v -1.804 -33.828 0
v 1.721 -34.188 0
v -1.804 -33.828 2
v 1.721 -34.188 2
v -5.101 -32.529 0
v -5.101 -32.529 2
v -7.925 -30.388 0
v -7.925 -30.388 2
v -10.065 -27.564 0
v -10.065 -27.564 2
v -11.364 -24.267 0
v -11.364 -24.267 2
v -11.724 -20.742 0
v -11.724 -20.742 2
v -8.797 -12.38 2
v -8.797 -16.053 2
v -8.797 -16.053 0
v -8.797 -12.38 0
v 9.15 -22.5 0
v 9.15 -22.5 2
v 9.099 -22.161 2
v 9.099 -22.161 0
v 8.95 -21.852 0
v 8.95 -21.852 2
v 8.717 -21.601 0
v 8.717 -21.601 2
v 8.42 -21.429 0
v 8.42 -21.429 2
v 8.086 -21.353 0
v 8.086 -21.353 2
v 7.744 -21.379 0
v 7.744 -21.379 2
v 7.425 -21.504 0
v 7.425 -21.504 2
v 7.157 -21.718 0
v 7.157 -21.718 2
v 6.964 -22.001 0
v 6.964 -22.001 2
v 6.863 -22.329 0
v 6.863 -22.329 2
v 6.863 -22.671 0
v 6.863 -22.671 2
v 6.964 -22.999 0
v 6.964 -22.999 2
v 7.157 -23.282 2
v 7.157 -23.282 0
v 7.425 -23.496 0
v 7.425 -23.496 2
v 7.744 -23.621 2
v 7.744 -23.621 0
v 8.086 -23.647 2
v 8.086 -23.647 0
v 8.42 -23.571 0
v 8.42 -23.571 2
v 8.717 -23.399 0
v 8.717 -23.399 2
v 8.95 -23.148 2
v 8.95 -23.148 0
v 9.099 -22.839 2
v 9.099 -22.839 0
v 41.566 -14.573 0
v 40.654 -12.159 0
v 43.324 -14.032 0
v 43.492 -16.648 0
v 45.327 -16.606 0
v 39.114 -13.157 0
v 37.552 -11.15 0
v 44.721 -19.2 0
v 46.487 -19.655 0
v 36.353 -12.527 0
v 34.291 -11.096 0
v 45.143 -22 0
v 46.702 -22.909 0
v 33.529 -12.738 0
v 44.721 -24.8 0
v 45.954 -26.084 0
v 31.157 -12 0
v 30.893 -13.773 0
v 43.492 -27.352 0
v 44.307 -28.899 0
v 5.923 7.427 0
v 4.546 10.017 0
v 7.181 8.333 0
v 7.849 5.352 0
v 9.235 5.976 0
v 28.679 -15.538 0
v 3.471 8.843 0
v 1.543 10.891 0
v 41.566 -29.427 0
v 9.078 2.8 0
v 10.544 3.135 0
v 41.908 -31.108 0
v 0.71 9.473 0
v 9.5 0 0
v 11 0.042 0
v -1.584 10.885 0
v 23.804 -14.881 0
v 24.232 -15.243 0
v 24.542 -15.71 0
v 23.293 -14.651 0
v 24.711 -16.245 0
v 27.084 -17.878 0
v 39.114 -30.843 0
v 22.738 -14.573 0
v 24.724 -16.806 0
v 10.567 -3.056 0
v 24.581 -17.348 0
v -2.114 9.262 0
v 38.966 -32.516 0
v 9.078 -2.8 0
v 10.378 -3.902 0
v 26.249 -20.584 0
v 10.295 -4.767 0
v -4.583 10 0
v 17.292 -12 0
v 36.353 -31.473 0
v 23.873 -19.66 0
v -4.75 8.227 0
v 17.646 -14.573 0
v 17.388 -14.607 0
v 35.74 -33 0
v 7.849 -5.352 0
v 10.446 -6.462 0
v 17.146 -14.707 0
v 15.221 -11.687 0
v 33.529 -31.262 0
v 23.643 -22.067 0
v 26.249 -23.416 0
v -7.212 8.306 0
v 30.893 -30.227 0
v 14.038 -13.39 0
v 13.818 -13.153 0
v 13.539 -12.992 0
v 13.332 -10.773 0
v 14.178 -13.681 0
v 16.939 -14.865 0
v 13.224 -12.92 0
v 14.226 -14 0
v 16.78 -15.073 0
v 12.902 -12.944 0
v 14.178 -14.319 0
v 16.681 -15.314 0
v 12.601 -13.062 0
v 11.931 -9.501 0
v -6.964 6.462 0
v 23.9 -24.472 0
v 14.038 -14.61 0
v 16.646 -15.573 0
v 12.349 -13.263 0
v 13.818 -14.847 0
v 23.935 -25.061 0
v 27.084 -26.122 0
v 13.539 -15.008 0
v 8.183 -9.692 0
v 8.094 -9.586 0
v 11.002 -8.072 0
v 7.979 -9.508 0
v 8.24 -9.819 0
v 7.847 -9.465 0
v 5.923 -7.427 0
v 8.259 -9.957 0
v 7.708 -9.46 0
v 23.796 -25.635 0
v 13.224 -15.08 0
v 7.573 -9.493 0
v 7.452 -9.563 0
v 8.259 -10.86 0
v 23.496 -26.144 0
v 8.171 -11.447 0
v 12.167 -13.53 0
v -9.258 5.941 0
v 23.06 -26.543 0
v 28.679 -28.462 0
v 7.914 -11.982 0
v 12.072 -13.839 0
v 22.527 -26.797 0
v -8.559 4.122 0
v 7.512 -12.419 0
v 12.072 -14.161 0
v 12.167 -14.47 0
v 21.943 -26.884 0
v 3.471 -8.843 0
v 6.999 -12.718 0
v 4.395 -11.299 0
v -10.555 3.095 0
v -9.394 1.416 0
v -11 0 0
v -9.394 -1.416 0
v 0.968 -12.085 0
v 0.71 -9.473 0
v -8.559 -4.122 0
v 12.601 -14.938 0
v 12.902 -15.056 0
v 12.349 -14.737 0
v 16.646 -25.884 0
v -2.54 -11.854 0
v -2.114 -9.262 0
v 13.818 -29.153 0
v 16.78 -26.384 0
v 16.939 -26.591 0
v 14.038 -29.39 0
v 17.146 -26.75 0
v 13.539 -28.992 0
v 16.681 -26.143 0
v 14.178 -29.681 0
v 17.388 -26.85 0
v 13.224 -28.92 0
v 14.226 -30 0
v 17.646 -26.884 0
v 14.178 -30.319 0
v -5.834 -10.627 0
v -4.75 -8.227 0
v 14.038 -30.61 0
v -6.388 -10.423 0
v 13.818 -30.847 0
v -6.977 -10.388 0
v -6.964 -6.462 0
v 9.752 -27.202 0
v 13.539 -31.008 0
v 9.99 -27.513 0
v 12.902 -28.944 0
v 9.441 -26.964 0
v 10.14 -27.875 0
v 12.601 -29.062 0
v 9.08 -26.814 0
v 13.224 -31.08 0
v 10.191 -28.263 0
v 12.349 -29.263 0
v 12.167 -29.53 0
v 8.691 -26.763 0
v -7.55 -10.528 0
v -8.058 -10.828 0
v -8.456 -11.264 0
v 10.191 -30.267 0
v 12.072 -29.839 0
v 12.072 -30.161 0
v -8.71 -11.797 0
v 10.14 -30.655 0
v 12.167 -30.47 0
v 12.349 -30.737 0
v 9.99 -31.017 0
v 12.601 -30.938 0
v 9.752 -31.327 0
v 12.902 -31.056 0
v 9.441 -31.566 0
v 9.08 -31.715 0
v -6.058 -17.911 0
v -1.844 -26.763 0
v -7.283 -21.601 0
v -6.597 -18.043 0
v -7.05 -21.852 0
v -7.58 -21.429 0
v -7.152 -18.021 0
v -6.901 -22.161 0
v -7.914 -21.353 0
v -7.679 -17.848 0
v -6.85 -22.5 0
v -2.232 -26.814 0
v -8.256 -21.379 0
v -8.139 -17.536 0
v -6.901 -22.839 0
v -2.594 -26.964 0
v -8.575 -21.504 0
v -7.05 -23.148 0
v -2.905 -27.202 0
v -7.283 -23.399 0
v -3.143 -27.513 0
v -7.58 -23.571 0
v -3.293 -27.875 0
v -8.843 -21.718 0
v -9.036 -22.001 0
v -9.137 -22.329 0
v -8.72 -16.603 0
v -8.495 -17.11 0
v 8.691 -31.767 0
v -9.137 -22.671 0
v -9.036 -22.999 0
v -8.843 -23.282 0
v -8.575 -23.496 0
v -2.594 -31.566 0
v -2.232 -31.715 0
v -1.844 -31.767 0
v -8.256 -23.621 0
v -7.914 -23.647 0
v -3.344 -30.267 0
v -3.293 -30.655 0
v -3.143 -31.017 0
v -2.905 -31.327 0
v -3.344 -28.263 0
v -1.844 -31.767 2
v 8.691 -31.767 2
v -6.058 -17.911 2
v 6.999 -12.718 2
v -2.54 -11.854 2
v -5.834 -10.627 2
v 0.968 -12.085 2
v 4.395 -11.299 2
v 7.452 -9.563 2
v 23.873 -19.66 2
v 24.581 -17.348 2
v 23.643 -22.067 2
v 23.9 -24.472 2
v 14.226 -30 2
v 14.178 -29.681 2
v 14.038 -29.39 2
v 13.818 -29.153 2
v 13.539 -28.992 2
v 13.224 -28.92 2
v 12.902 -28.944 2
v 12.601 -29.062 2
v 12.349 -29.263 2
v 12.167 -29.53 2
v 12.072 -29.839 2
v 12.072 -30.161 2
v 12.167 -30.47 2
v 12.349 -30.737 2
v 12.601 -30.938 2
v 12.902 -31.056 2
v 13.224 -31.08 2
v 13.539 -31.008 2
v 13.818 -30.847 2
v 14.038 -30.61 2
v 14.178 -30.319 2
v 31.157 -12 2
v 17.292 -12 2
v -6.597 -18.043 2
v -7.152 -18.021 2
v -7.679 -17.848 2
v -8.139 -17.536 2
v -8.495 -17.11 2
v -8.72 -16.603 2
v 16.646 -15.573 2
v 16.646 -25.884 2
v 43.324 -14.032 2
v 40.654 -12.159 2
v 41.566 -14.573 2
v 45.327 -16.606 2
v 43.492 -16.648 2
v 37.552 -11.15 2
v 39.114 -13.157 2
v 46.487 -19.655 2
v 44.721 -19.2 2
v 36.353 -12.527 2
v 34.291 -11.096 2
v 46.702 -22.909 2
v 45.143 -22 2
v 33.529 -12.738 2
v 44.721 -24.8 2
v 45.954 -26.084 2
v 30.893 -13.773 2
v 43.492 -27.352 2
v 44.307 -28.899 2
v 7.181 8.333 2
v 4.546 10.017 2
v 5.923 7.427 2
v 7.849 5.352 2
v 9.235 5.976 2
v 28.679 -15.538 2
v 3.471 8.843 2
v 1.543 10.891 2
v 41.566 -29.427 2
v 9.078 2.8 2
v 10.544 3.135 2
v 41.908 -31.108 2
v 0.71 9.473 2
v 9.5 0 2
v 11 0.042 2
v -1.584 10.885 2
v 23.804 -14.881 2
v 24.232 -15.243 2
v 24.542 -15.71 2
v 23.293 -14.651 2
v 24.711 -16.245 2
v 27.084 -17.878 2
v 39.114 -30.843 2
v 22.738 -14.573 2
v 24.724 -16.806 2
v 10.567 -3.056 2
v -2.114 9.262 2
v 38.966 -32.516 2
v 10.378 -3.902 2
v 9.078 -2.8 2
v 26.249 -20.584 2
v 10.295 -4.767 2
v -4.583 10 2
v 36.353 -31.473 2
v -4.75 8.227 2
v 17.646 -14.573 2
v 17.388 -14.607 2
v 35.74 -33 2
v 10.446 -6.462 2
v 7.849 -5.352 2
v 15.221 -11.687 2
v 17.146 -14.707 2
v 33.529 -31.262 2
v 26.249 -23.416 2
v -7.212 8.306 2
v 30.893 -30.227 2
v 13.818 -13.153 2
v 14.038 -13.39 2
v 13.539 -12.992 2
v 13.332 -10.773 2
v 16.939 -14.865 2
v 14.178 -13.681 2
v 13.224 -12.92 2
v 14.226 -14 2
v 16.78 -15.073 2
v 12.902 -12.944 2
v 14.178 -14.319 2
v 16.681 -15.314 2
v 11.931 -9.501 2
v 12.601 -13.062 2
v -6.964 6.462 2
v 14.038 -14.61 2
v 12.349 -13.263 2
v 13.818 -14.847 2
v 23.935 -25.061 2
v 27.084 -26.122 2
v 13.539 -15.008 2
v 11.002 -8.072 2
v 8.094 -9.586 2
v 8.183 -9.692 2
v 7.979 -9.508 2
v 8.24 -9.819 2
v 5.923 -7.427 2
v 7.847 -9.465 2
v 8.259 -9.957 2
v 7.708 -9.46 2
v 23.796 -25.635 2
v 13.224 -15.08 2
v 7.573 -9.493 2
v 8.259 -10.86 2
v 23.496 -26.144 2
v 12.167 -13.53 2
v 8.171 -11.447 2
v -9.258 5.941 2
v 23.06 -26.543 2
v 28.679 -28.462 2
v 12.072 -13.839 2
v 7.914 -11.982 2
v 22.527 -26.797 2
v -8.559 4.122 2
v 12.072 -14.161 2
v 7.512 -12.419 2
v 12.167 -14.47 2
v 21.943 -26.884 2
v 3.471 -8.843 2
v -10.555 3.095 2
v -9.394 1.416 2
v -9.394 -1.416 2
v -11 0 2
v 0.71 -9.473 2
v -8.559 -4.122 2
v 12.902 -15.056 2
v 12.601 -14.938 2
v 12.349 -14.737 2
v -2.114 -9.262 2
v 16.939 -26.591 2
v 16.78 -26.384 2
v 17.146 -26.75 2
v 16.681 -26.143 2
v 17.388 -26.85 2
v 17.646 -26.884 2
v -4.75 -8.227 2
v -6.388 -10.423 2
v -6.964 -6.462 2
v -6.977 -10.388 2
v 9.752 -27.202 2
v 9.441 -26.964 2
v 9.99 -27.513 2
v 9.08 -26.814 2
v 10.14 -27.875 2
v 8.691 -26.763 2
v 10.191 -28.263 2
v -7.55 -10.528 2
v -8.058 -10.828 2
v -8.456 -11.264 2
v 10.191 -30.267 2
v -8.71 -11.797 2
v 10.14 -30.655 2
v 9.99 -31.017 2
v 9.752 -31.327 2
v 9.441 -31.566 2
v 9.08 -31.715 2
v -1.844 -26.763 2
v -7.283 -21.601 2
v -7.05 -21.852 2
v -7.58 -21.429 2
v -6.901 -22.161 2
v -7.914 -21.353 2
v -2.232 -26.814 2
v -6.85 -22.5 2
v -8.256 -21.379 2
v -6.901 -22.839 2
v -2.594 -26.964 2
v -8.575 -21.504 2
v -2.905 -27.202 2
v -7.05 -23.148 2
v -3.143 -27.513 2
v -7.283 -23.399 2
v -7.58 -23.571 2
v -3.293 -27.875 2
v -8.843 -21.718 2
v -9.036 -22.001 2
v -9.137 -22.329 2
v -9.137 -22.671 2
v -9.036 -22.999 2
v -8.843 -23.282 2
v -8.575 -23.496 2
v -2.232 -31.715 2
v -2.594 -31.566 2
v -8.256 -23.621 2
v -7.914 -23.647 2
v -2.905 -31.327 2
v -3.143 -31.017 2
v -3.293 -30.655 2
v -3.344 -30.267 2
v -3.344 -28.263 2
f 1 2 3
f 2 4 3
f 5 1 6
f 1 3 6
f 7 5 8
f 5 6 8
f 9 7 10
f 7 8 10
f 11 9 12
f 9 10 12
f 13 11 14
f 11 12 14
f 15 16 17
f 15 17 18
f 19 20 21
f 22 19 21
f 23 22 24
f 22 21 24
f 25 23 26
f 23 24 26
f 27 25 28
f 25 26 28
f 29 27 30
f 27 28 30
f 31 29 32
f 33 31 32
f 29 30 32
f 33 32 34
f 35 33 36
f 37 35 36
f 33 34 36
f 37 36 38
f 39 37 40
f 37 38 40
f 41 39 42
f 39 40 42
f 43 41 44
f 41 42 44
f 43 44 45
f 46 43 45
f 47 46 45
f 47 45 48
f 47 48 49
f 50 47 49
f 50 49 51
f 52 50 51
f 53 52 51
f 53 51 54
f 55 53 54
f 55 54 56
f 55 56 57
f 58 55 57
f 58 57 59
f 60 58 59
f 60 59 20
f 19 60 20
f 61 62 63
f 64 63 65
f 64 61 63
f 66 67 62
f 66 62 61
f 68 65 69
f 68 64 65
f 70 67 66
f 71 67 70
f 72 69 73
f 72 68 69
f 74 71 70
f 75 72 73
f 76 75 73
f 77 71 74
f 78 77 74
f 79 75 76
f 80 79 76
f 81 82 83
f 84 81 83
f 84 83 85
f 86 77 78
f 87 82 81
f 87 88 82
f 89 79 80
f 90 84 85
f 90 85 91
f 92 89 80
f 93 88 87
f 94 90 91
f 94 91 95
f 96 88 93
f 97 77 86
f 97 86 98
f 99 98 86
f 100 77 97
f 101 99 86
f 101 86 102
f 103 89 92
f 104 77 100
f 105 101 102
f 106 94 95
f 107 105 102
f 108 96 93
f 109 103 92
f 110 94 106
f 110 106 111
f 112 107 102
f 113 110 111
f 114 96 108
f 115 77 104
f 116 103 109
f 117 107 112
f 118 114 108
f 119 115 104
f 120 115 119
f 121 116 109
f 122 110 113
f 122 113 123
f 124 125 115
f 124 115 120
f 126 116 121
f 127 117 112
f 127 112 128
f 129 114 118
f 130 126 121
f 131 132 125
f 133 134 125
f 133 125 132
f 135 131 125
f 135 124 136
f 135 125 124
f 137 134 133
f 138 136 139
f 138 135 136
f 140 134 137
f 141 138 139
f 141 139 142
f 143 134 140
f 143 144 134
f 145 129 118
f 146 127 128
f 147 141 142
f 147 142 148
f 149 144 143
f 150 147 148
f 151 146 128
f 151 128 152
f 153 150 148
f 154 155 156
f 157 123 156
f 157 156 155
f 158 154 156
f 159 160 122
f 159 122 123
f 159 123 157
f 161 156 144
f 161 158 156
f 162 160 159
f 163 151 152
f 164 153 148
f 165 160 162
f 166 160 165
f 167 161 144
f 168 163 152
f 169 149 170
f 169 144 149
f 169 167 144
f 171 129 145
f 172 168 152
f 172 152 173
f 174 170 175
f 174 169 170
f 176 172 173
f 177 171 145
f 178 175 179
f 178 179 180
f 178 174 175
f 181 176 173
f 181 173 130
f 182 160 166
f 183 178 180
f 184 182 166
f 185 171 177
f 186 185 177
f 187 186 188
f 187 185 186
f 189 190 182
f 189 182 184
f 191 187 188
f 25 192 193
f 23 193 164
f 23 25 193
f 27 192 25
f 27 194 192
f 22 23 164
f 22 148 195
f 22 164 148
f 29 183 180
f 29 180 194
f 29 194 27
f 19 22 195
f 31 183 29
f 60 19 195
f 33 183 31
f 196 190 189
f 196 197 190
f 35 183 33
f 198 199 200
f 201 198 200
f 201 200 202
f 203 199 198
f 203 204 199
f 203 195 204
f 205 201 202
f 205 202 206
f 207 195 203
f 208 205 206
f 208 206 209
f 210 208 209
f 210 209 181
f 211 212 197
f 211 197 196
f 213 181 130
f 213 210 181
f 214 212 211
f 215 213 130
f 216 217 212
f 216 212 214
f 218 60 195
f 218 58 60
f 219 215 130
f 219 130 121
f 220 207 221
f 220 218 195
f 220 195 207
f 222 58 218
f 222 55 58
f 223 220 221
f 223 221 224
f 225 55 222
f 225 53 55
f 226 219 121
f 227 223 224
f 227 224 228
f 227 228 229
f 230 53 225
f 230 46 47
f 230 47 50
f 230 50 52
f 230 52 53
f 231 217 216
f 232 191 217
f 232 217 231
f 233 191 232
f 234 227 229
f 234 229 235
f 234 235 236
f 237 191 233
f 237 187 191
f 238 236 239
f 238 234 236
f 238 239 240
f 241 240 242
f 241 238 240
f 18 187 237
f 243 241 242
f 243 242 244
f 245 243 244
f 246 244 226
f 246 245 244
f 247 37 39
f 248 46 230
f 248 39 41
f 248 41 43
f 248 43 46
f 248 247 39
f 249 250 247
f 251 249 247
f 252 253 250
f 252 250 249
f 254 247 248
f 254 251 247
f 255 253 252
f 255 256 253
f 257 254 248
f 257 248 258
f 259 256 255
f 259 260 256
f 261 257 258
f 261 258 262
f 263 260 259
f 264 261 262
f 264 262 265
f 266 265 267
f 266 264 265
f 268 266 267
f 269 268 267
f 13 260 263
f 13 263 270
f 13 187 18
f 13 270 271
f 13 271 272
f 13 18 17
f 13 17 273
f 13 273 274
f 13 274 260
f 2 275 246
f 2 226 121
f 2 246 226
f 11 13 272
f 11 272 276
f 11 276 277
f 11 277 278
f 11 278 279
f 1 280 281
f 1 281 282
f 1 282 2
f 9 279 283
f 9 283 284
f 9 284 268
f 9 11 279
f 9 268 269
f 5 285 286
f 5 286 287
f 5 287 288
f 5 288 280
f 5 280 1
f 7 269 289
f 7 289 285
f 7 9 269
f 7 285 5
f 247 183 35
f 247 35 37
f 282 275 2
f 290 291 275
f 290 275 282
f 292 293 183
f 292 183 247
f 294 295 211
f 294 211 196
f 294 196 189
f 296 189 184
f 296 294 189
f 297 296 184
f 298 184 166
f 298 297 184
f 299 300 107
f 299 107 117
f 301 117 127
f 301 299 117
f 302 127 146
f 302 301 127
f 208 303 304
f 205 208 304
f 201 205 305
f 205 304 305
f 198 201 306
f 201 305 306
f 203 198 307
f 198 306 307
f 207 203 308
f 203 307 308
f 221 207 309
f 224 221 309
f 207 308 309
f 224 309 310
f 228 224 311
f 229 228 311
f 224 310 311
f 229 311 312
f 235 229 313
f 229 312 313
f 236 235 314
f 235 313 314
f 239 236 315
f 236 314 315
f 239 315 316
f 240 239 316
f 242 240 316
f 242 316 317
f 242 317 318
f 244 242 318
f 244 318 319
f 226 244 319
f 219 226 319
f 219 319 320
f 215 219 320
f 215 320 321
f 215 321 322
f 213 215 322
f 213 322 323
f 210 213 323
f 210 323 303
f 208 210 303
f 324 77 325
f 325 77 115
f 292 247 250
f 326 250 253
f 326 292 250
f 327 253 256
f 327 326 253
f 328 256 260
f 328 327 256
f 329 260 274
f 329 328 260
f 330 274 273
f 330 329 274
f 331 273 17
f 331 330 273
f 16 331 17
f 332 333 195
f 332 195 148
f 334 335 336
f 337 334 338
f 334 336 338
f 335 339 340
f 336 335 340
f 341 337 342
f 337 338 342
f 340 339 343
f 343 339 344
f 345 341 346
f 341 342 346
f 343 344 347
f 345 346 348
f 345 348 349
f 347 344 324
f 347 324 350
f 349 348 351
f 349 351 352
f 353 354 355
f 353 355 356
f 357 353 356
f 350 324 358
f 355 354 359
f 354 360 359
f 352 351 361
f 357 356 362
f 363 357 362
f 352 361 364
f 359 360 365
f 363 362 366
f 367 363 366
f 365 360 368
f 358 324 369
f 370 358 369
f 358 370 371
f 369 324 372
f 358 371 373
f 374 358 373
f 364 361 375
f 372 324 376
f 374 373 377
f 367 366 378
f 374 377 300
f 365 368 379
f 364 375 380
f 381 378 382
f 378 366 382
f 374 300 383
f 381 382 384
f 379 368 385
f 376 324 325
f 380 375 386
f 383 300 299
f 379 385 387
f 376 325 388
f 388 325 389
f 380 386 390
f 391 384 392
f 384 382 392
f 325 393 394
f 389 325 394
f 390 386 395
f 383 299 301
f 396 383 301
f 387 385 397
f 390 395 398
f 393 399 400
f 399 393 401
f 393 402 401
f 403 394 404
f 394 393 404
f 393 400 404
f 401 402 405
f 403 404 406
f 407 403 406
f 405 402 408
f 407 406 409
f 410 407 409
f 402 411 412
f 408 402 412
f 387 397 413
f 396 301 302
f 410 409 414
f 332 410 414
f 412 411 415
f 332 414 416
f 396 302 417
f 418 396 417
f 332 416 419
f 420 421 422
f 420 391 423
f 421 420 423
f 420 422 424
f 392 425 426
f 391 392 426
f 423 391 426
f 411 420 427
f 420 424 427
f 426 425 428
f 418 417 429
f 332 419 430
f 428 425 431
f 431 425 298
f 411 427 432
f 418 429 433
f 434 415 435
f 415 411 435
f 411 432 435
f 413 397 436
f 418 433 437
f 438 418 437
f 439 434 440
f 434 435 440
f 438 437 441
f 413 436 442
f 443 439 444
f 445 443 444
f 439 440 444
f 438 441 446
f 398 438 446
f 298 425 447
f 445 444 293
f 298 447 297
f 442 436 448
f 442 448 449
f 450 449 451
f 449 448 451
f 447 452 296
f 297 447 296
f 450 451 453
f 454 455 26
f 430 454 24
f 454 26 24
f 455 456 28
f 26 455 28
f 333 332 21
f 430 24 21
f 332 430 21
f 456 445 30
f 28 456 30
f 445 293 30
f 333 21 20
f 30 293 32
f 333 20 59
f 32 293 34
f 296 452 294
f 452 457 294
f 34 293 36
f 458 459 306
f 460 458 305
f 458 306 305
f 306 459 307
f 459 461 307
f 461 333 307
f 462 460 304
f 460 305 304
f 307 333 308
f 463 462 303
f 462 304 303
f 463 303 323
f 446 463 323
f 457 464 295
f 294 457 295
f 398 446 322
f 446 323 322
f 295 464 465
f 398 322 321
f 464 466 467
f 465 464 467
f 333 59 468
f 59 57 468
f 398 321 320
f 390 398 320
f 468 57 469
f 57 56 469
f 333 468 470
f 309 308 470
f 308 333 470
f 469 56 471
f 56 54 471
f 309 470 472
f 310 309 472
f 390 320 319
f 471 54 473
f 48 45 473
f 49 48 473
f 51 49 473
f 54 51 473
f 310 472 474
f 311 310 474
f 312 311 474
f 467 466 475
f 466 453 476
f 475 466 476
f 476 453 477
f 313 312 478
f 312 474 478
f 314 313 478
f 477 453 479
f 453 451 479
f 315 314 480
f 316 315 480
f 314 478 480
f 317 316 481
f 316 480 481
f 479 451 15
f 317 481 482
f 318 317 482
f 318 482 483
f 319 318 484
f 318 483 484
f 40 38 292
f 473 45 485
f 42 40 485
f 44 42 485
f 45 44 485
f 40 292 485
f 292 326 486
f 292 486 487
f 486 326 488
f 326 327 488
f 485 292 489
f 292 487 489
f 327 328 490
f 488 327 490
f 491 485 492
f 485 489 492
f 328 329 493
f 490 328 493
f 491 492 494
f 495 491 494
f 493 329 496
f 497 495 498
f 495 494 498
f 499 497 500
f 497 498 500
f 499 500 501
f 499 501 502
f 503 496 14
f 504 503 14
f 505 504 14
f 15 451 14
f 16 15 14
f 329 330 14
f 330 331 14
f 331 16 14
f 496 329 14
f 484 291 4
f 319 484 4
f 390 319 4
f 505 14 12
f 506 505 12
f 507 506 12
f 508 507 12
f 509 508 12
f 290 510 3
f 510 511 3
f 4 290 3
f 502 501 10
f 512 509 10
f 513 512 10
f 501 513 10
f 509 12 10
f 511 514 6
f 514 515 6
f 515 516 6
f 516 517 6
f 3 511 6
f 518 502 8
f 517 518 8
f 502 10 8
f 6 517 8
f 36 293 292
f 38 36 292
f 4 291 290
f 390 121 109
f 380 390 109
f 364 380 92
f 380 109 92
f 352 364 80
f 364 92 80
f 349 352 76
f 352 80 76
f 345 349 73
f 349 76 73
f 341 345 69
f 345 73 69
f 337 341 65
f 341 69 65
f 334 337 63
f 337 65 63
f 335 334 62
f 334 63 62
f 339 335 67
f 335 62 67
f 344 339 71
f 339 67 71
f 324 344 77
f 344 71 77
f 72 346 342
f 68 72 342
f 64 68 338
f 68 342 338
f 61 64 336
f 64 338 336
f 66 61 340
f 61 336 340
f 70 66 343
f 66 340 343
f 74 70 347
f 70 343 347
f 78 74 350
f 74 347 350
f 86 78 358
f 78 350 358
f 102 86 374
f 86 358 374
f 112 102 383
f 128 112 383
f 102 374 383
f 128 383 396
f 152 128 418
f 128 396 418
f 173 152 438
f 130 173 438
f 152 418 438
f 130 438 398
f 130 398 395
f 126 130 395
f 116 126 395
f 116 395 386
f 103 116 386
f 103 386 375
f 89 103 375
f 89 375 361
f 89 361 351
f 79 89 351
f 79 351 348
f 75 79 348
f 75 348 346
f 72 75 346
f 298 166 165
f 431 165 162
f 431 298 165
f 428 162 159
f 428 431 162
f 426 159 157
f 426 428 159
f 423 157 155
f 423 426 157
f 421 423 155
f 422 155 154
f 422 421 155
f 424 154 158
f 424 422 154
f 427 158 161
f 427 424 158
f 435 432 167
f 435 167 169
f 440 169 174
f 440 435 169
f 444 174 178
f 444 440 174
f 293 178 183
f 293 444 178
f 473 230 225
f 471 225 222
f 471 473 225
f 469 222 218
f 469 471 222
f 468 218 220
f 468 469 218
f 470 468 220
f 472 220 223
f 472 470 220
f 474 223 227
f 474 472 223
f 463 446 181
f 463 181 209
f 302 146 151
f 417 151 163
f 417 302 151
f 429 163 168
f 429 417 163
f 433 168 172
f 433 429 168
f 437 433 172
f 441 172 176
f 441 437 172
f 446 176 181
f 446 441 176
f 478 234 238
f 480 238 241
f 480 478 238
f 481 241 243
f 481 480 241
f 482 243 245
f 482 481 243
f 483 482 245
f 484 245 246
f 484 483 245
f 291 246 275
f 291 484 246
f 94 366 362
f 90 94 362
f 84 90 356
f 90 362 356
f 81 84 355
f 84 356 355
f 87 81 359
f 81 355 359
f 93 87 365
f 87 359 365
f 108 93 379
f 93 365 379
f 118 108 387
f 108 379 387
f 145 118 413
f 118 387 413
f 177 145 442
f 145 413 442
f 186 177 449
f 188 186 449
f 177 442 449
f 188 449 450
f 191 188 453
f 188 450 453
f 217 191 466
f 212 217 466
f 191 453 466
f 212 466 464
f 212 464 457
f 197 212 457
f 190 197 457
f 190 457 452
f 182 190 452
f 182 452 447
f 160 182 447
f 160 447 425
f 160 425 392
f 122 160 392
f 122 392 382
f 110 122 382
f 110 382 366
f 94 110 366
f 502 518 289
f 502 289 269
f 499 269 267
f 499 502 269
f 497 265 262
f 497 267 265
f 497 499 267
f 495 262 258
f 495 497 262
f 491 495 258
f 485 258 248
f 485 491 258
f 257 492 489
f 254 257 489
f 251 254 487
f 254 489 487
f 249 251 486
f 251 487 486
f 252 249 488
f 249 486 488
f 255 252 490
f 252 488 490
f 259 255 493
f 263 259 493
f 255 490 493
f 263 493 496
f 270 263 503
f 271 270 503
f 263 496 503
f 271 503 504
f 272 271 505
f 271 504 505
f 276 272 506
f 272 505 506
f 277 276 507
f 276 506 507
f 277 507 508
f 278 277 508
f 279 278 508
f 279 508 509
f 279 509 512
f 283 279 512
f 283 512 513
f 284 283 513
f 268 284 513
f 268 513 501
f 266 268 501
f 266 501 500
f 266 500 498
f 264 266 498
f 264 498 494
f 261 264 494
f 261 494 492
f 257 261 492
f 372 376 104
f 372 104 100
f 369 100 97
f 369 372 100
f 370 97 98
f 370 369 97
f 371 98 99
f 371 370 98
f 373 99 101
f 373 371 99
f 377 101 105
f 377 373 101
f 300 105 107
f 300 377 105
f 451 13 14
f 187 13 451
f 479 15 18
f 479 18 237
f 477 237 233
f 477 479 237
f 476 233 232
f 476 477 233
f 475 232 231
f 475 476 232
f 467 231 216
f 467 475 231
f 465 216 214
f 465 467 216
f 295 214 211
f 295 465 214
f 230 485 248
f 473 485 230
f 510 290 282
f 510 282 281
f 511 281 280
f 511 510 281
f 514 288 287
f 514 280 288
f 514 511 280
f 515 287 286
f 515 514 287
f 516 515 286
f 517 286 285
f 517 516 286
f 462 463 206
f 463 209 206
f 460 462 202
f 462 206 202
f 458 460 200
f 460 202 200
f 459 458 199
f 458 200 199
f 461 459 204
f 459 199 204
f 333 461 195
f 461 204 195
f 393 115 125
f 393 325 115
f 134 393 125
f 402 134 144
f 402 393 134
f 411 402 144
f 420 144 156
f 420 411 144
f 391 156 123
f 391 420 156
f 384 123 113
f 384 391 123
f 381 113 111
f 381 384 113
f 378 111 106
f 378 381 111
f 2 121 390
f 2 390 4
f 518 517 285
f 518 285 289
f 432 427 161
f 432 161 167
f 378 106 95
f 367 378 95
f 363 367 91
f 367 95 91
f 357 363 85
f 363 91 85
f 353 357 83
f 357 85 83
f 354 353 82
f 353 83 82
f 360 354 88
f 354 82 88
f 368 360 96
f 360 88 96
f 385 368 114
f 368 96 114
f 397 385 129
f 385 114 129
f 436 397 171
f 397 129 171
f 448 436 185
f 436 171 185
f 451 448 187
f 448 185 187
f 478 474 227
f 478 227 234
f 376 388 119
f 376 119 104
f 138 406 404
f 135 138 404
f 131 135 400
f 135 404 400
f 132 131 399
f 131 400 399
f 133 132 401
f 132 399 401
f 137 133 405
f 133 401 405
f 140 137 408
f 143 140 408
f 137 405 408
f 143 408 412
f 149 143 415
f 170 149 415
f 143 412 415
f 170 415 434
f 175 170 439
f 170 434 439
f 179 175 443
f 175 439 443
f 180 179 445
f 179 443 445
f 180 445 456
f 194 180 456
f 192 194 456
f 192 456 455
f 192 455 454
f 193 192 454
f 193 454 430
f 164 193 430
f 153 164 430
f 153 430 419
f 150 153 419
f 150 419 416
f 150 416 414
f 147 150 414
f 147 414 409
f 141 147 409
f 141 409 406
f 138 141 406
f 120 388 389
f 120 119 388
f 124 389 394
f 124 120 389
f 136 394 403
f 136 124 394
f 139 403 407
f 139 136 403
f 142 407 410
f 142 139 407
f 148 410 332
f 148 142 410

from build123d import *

# Parameters (mm, degrees)
SKETCH_3_R          = 9.5
EXTRUDE_1_DEPTH     = 2
EXTRUDE_START       = -2
EXTRUDE_2_DEPTH     = 2
FILLET_2_R          = 13
SKETCH_5_R          = 1.15
CUT_EXTRUDE_1_DEPTH = 58.948126493
SKETCH_6_R          = 9.5
CUT_EXTRUDE_2_DEPTH = 58.948126493
FILLET_3_R          = 8
FILLET_4_R          = 7
SKETCH_7_R          = 1.08334678
CUT_EXTRUDE_4_DEPTH = 10
CUT_EXTRUDE_5_DEPTH = 10
FILLET_5_R          = 1


with BuildPart() as part:
    # 草图3 → 凸台-拉伸1 (new body)
    with BuildSketch(Plane.XY):
        with BuildLine():
            Line((-11, 0), (-11, -33))
            Line((-11, -33), (35.74, -33))
            ThreePointArc((35.74, -33), (46.48709263, -19.65479212), (31.157424305, -12))
            Line((31.157424305, -12), (9, -12))
            Line((9, -12), (9, -6.32455532))
            ThreePointArc((9, -6.32455532), (3.31662479, 10.488088482), (-11, 0))
        make_face()
        Circle(SKETCH_3_R, mode=Mode.SUBTRACT)
        with Locations((35.74, -22)):
            Circle(SKETCH_3_R, mode=Mode.SUBTRACT)
    extrude(amount=EXTRUDE_1_DEPTH)

    # 草图4 → 凸台-拉伸2 (add)
    with BuildSketch(Plane.XY.offset(2).offset(EXTRUDE_START)):
        with BuildLine():
            Line((35.74, -33), (-12.210859555, -34.674480913))
            Line((-12.210859555, -34.674480913), (-11, 0))
            ThreePointArc((-11, 0), (3.31662479, 10.488088482), (9, -6.32455532))
            Line((9, -6.32455532), (9, -12))
            Line((9, -12), (31.157424305, -12))
            ThreePointArc((31.157424305, -12), (46.48709263, -19.65479212), (35.74, -33))
        make_face()
    extrude(amount=EXTRUDE_2_DEPTH)

    # 圆角2
    fillet_2_edges = [part.edges().sort_by_distance(p)[0] for p in [
        (-12.210859555, -34.674480913, 1),
    ]]
    fillet(fillet_2_edges, radius=FILLET_2_R)

    # 草图5 → 切除-拉伸1 (cut, through all)
    with BuildSketch(Plane.XY.offset(2)):
        with Locations((-8, -22.5)):
            Circle(SKETCH_5_R)
        with Locations((8, -22.5)):
            Circle(SKETCH_5_R)
    extrude(amount=-CUT_EXTRUDE_1_DEPTH, mode=Mode.SUBTRACT)

    # 草图6 → 切除-拉伸2 (cut, through all)
    with BuildSketch(Plane.XY.offset(2)):
        Circle(SKETCH_6_R)
        with Locations((35.642814002, -22)):
            Circle(SKETCH_6_R)
    extrude(amount=-CUT_EXTRUDE_2_DEPTH, mode=Mode.SUBTRACT)

    # 圆角3
    # the kernel refuses this fillet: 8 mm, written as the material it adds along each edge
    with BuildSketch(Plane(origin=(9, -12, 0), x_dir=(0, 1, 0), z_dir=(0, 0, 1))) as fillet_3_piece_1:
        with BuildLine():
            CenterArc((8, -7.654831322), FILLET_3_R, 106.89204914, 73.10795086)
            Line((0, -7.654831322), (-0.16, -7.654831322))
            Line((-0.16, -7.654831322), (-0.16, 0))
            Line((-0.16, 0), (0, 0.16))
            ThreePointArc((0, 0.16), (2.83772234, 0.16), (5.628953573, 0.153096626))
            Line((5.628953573, 0.153096626), (5.67544468, 0))
        make_face()
    extrude(amount=2)

    # 圆角4
    fillet_4_edges = [part.edges().sort_by_distance(p)[0] for p in [
        (9, -6.32455532, 1),
    ]]
    fillet(fillet_4_edges, radius=FILLET_4_R)

    # 草图7 → 切除-拉伸4 (cut)
    with BuildSketch(Plane.XY.offset(2)):
        with Locations((13.142814002, -14)):
            Circle(SKETCH_7_R)
        with Locations((13.142814002, -30)):
            Circle(SKETCH_7_R)
    extrude(amount=-CUT_EXTRUDE_4_DEPTH, mode=Mode.SUBTRACT)

    # 草图8 → 切除-拉伸5 (cut)
    with BuildSketch(Plane.XY.offset(2)):
        with BuildLine():
            Line((16.646480101, -26.883817545), (16.646480101, -14.57255416))
            Line((16.646480101, -14.57255416), (22.737666516, -14.57255416))
            ThreePointArc((22.737666516, -14.57255416), (24.403604511, -15.465914835), (24.581259014, -17.347903565))
            ThreePointArc((24.581259014, -17.347903565), (23.697285572, -20.857918339), (23.900157183, -24.47184361))
            ThreePointArc((23.900157183, -24.47184361), (23.496100815, -26.143986607), (21.943047713, -26.883817545))
            Line((21.943047713, -26.883817545), (16.646480101, -26.883817545))
        make_face()
        with BuildLine():
            Line((-1.844212644, -26.7628803), (8.691309214, -26.7628803))
            ThreePointArc((8.691309214, -26.7628803), (9.751969386, -27.202220128), (10.191309214, -28.2628803))
            Line((10.191309214, -28.2628803), (10.191309214, -30.26653293))
            ThreePointArc((10.191309214, -30.26653293), (9.751969386, -31.327193102), (8.691309214, -31.76653293))
            Line((8.691309214, -31.76653293), (-1.844212644, -31.76653293))
            ThreePointArc((-1.844212644, -31.76653293), (-2.904872816, -31.327193102), (-3.344212644, -30.26653293))
            Line((-3.344212644, -30.26653293), (-3.344212644, -28.2628803))
            ThreePointArc((-3.344212644, -28.2628803), (-2.904872816, -27.202220128), (-1.844212644, -26.7628803))
        make_face()
        with BuildLine():
            Line((-8.796911022, -16.052867786), (-8.796911022, -12.380312846))
            ThreePointArc((-8.796911022, -12.380312846), (-7.815486406, -10.659120182), (-5.834406834, -10.627148368))
            ThreePointArc((-5.834406834, -10.627148368), (0.968228408, -12.084664633), (7.452020697, -9.562634212))
            ThreePointArc((7.452020697, -9.562634212), (7.978826228, -9.507761331), (8.259361329, -9.957022011))
            Line((8.259361329, -9.957022011), (8.259361329, -10.859557769))
            ThreePointArc((8.259361329, -10.859557769), (7.914413338, -11.982412545), (6.99855848, -12.717940822))
            Line((6.99855848, -12.717940822), (-6.057713871, -17.911250839))
            ThreePointArc((-6.057713871, -17.911250839), (-7.919765799, -17.707919794), (-8.796911022, -16.052867786))
        make_face()
    extrude(amount=-CUT_EXTRUDE_5_DEPTH, mode=Mode.SUBTRACT)

    # 圆角5
    fillet_5_edges = [part.edges().sort_by_distance(p)[0] for p in [
        (16.646480101, -26.883817545, 1),
        (16.646480101, -14.57255416, 1),
    ]]
    fillet(fillet_5_edges, radius=FILLET_5_R)


solid = part.part
